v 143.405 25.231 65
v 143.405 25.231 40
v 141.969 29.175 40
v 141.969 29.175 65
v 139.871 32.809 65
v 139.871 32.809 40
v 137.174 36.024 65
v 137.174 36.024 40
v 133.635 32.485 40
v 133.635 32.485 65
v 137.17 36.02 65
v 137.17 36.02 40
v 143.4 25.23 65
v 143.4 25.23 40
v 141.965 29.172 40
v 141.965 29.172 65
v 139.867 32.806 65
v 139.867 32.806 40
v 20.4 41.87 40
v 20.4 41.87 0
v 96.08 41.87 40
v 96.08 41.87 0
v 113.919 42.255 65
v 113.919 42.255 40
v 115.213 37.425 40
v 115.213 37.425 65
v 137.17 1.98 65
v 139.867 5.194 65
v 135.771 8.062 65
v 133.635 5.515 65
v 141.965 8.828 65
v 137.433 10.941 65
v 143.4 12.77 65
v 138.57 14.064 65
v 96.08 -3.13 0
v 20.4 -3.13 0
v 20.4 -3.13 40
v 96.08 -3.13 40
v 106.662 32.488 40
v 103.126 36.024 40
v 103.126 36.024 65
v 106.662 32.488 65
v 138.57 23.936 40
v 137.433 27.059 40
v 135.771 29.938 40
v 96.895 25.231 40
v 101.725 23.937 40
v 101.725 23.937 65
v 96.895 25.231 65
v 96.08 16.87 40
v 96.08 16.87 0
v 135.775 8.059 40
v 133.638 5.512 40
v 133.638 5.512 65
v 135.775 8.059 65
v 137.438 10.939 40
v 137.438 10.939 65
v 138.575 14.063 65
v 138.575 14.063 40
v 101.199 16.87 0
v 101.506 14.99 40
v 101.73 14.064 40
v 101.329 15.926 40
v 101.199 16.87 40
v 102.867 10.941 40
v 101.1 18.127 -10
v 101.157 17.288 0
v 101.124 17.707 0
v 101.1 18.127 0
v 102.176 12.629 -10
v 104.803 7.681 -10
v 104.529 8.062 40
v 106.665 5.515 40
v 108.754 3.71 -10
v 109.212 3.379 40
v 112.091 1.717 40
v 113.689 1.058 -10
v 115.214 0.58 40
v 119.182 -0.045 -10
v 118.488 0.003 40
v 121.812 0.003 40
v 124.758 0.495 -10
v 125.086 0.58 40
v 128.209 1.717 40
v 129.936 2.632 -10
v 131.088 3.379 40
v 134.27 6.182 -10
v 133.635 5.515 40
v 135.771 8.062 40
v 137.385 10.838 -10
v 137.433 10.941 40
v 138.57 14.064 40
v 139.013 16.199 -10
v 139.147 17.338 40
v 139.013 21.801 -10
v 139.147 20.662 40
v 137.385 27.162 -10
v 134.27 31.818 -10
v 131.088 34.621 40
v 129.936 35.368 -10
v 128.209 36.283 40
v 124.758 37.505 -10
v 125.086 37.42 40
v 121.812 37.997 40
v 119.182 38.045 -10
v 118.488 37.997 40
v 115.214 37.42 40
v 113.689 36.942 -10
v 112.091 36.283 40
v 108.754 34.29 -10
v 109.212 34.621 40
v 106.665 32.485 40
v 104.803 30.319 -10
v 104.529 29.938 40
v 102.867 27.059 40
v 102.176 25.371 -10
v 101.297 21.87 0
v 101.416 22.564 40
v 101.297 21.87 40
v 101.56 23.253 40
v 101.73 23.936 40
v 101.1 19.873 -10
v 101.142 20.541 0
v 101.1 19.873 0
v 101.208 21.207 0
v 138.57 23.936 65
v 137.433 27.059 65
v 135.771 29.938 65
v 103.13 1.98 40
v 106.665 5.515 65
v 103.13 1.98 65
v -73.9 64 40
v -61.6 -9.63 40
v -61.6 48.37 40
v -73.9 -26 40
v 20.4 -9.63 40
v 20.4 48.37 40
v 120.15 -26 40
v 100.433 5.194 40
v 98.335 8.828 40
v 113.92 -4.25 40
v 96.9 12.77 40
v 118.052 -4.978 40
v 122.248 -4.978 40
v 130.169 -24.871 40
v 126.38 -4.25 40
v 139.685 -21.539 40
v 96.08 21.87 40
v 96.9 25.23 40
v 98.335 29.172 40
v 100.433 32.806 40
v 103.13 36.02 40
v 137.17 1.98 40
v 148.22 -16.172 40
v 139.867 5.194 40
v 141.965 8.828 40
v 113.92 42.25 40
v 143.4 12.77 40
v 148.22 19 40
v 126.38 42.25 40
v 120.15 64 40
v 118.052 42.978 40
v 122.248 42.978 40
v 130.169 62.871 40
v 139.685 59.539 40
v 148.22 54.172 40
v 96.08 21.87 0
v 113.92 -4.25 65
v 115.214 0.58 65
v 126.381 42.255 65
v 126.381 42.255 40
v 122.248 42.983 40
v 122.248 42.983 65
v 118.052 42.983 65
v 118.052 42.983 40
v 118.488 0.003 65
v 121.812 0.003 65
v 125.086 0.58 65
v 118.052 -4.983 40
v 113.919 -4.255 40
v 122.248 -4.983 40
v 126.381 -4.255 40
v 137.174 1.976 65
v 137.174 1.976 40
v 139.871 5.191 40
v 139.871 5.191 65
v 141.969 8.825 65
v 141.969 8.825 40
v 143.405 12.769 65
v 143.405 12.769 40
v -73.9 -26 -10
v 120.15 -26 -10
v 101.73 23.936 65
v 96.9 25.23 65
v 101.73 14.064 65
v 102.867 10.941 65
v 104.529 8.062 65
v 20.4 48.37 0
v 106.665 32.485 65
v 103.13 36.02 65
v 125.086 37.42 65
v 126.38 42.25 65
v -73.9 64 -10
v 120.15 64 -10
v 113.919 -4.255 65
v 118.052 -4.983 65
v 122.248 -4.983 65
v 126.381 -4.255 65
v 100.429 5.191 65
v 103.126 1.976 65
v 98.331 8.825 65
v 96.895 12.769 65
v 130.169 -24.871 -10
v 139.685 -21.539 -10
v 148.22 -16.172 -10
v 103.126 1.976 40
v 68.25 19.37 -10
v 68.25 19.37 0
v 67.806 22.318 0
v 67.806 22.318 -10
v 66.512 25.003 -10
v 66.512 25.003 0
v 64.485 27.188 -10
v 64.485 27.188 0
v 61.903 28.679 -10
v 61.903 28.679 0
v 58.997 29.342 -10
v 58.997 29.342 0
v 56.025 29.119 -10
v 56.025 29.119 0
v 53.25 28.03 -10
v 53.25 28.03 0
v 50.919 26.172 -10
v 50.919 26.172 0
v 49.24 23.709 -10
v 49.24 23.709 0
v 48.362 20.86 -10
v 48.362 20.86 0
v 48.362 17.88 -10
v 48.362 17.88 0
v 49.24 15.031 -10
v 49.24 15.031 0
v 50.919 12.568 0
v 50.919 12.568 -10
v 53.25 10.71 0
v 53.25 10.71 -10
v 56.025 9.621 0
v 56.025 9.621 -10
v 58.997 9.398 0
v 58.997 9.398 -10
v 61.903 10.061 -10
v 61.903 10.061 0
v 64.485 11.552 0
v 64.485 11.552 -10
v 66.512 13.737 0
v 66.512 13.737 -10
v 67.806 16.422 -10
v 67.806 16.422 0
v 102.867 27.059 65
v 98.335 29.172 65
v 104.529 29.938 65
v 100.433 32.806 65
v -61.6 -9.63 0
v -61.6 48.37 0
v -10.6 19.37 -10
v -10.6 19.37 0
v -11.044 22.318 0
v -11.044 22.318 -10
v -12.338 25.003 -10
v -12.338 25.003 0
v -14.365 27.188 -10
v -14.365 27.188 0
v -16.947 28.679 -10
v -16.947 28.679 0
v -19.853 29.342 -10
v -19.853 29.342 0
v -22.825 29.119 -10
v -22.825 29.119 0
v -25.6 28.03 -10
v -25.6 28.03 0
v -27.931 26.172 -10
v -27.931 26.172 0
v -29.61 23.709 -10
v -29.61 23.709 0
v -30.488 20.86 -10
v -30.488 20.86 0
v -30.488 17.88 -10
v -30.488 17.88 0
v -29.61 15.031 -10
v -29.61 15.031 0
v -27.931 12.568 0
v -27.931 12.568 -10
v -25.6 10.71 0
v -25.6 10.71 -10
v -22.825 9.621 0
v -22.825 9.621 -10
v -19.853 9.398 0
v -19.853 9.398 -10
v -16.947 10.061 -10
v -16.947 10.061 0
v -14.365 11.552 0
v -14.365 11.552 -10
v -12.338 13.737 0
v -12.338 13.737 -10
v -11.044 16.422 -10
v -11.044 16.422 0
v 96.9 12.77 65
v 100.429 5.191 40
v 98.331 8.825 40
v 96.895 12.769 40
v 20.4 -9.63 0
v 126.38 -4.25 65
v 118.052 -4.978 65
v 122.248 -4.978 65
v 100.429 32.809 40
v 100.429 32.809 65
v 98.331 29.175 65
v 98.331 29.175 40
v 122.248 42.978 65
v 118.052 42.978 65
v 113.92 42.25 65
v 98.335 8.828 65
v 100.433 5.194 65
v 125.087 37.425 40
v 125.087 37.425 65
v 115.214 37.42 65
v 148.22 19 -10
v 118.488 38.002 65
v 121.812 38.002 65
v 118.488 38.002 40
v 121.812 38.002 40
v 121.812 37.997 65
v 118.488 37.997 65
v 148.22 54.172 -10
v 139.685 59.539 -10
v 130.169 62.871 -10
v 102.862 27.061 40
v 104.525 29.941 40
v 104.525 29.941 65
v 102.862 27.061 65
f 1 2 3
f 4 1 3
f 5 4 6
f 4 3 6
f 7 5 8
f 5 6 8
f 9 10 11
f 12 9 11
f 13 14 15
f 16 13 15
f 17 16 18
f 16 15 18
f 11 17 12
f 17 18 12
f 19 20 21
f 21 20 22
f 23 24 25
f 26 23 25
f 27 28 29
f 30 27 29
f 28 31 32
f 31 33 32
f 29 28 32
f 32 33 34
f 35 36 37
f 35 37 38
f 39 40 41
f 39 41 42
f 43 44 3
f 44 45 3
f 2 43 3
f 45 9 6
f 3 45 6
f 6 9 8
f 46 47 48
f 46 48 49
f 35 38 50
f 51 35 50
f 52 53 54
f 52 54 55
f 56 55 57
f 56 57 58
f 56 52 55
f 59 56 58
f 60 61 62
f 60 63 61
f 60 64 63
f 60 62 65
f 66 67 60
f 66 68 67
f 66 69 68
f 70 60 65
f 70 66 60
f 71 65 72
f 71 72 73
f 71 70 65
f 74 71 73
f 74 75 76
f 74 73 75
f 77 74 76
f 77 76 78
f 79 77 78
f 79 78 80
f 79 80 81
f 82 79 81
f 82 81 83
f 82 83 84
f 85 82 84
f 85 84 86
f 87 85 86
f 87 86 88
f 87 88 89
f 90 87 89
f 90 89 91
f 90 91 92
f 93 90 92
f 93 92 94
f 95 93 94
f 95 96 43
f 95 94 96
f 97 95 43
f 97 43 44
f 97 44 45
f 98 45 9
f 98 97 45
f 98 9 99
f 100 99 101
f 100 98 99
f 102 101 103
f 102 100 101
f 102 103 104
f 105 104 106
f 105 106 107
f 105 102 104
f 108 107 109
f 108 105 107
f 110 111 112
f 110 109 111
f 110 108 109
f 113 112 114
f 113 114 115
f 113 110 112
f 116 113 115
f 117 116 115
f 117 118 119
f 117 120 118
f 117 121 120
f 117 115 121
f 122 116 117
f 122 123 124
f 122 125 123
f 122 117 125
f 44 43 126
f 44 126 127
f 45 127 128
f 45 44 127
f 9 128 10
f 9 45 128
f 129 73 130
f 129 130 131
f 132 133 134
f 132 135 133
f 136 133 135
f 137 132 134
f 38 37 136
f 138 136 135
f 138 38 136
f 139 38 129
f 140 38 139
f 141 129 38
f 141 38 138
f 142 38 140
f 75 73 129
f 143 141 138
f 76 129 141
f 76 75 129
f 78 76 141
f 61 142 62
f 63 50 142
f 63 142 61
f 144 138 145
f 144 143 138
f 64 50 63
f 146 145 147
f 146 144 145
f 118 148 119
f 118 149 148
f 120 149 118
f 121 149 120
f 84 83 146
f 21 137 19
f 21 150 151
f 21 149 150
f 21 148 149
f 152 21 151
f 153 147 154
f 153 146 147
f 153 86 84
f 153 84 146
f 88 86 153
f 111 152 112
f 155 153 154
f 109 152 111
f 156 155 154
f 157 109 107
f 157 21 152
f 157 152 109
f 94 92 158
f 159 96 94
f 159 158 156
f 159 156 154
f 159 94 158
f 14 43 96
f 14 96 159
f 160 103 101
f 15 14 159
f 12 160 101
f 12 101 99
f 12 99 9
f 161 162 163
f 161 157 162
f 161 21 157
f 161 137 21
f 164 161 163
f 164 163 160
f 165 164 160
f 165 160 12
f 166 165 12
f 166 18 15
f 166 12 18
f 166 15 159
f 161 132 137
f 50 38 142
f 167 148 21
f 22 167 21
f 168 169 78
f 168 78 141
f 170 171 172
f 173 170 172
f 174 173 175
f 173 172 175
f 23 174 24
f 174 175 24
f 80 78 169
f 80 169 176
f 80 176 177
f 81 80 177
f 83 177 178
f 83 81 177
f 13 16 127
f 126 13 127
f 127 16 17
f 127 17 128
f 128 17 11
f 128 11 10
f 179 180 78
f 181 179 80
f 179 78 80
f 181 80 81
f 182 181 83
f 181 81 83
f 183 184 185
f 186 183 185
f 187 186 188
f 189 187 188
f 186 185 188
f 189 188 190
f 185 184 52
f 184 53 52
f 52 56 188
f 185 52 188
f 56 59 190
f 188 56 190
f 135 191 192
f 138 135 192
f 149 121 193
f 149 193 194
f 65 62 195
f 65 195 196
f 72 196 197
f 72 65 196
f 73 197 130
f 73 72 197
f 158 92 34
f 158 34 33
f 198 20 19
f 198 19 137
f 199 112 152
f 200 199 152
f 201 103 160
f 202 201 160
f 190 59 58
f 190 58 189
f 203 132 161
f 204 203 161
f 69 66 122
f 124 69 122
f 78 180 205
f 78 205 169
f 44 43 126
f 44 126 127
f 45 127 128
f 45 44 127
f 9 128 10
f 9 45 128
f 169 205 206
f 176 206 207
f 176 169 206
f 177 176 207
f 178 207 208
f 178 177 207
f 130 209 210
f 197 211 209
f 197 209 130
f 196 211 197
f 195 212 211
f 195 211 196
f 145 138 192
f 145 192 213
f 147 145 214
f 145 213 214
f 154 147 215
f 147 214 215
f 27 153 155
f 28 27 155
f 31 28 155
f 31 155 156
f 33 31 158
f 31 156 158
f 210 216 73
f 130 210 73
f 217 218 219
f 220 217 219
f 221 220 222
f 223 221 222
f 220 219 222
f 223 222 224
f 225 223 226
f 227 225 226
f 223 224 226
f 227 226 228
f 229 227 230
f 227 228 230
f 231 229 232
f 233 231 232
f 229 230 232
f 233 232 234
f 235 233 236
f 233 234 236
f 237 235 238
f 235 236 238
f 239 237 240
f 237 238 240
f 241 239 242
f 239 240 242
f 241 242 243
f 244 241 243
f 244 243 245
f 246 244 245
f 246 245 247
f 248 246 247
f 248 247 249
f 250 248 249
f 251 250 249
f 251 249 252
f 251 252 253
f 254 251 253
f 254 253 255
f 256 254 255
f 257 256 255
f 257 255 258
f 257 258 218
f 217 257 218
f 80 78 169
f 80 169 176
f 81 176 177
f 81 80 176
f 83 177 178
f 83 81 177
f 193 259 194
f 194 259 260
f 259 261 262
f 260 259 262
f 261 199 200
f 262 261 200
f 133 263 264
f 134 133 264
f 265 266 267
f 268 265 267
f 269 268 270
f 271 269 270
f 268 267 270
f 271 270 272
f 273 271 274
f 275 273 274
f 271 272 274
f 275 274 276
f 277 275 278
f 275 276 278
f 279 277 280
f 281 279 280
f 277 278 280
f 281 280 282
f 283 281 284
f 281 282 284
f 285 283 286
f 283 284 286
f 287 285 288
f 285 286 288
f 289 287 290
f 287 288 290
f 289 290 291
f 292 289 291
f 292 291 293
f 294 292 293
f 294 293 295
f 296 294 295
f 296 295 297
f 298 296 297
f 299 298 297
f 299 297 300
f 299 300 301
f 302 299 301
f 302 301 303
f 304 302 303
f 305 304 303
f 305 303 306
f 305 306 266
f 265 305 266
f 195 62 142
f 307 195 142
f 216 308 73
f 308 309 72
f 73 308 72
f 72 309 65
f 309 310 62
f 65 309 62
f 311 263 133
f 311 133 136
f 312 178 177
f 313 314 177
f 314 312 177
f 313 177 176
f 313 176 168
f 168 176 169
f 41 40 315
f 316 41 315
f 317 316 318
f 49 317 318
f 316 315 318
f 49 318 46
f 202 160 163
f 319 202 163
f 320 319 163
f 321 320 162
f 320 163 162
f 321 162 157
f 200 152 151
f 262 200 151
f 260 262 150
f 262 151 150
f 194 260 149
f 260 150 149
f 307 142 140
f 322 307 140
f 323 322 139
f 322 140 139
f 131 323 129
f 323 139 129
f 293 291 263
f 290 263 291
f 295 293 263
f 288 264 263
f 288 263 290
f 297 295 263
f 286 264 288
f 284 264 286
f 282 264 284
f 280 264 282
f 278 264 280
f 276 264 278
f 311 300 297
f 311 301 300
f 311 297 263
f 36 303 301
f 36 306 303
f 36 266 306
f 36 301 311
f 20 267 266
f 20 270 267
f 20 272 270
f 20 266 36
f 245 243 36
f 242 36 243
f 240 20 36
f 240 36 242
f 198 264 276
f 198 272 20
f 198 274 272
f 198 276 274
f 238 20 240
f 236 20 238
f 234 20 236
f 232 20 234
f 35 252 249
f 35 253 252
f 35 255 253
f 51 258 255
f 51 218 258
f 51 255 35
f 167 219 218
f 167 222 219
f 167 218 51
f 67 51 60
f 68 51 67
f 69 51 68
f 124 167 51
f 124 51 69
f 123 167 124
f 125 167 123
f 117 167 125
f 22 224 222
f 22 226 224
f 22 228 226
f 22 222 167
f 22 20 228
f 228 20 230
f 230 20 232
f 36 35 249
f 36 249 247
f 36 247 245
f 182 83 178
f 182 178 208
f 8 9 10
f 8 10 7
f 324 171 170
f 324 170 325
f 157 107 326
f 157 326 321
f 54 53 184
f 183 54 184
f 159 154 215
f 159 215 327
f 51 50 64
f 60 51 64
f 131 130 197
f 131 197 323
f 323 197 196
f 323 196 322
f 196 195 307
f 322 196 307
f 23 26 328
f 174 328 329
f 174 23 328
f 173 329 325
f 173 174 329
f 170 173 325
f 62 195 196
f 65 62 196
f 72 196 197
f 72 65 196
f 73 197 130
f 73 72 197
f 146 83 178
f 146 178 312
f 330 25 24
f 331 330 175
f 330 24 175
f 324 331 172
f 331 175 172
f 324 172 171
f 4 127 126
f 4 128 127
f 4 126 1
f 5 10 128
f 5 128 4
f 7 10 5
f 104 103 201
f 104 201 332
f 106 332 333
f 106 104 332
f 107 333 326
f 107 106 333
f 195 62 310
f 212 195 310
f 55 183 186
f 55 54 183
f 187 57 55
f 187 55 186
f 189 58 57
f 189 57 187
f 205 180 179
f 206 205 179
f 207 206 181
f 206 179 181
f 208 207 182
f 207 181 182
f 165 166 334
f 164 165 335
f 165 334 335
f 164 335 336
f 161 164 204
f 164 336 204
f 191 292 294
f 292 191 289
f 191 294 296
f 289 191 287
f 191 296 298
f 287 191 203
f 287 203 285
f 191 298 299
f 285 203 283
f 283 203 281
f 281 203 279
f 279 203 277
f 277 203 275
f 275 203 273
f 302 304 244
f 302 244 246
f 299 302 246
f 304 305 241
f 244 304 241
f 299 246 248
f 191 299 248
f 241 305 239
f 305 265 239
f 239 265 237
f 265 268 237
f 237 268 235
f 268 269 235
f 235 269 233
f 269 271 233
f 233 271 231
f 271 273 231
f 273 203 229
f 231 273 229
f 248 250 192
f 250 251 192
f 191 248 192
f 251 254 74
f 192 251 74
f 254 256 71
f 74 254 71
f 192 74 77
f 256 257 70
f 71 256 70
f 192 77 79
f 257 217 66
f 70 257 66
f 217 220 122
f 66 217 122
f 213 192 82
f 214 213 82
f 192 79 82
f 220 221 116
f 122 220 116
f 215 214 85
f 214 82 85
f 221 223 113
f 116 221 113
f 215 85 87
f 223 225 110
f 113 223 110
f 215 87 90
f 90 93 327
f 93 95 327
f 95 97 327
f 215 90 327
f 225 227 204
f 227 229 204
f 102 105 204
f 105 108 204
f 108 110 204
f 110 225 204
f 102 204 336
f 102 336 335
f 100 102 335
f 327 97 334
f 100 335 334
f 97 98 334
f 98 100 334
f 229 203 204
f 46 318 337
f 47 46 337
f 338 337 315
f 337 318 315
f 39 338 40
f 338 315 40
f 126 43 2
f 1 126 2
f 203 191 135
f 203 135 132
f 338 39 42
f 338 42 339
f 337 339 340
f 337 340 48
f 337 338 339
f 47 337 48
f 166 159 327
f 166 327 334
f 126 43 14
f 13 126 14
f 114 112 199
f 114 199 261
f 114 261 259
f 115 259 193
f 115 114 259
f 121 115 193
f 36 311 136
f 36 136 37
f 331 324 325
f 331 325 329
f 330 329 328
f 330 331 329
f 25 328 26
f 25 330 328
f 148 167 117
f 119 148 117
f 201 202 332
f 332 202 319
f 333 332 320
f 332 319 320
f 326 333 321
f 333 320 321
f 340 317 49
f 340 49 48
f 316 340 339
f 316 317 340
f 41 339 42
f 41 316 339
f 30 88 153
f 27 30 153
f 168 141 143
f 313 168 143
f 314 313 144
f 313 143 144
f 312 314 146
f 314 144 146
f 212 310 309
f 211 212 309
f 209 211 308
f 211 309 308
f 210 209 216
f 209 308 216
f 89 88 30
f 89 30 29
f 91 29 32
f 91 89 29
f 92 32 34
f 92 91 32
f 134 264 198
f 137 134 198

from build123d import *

# Parameters (mm, degrees)
EXTRUDE004_DEPTH                          = 25
EXTRUDE004_ONTO_SKETCH003_PLACEMENT_ANGLE = 15
SKETCH005_W                               = 9
SKETCH005_H                               = 5
EXTRUDE008_DEPTH                          = 40
EXTRUDE005_DEPTH                          = 50
EXTRUDE005_ONTO_SKETCH004_PLACEMENT_ANGLE = 15
TUBE_R                                    = 45
TUBE_R_2                                  = 19.07
TUBE_DEPTH                                = 50
TUBE_PLACEMENT_ANGLE                      = 15
SKETCH007_W                               = 19.05
SKETCH007_H                               = 4.2311699947
EXTRUDE009_DEPTH                          = 50
SKETCH006_R                               = 10
EXTRUDE007_DEPTH                          = 20
BOX001_W                                  = 82
BOX001_H                                  = 58
BOX001_DEPTH                              = 44.4
BOX007_W                                  = 5
BOX007_H                                  = 5
BOX007_DEPTH                              = 44.4
SKETCH001_R                               = 5
EXTRUDE001_DEPTH                          = 4
EXTRUDE002_DEPTH                          = 15
SKETCH_R                                  = 12.3
EXTRUDE_DEPTH                             = 5
BOX_W                                     = 75.7
BOX_H                                     = 45
BOX_DEPTH                                 = 44.4
BOX002_W                                  = 175
BOX002_H                                  = 90
BOX002_DEPTH                              = 50
EXTRUDE010_DEPTH                          = 25


with BuildPart() as fingers:
    # Sketch003 as drawn → Extrude004 (new)
    with BuildSketch(Plane.XY):
        with BuildLine():
            ThreePointArc((12.0375, 20.8495615961), (6.2310685108, 23.2546642679), (0, 24.075))
            Line((0, 24.075), (0, 19.075))
            ThreePointArc((9.5375, 16.5194345772), (4.9369732853, 18.4250351365), (0, 19.075))
            Line((12.0375, 20.8495615961), (9.5375, 16.5194345772))
        make_face()
        with BuildLine():
            ThreePointArc((24.075, 0), (23.2546642679, 6.2310685108), (20.8495615961, 12.0375))
            Line((16.5151044502, 9.535), (20.8495615961, 12.0375))
            ThreePointArc((19.07, 0), (18.4202055073, 4.9356791901), (16.5151044502, 9.535))
            Line((19.07, 0), (24.075, 0))
        make_face()
        with BuildLine():
            ThreePointArc((12.0375, -20.8495615961), (17.0235957571, -17.0235957571), (20.8495615961, -12.0375))
            Line((16.5194345772, -9.5375), (20.8495615961, -12.0375))
            ThreePointArc((9.5375, -16.5194345772), (13.4880618511, -13.4880618511), (16.5194345772, -9.5375))
            Line((9.5375, -16.5194345772), (12.0375, -20.8495615961))
        make_face()
        with BuildLine():
            ThreePointArc((-12.0375, -20.8495615961), (-6.2310685108, -23.2546642679), (0, -24.075))
            Line((0, -19.07), (0, -24.075))
            ThreePointArc((-9.535, -16.5151044502), (-4.9356791901, -18.4202055073), (0, -19.07))
            Line((-12.0375, -20.8495615961), (-9.535, -16.5151044502))
        make_face()
        with BuildLine():
            ThreePointArc((-24.075, 0), (-23.2546642679, -6.2310685108), (-20.8495615961, -12.0375))
            Line((-20.8495615961, -12.0375), (-16.5151044502, -9.535))
            ThreePointArc((-19.07, 0), (-18.4202055073, -4.9356791901), (-16.5151044502, -9.535))
            Line((-19.07, 0), (-24.075, 0))
        make_face()
        with BuildLine():
            ThreePointArc((-12.0375, 20.8495615961), (-17.0235957571, 17.0235957571), (-20.8495615961, 12.0375))
            Line((-16.5194345772, 9.5375), (-20.8495615961, 12.0375))
            ThreePointArc((-9.5375, 16.5194345772), (-13.4880618511, 13.4880618511), (-16.5194345772, 9.5375))
            Line((-12.0375, 20.8495615961), (-9.5375, 16.5194345772))
        make_face()
    extrude(amount=EXTRUDE004_DEPTH)


with BuildPart() as fingers_1:
    # Extrude004 onto Sketch003 placement: moved
    add(fingers.part.moved(Location((120.15, 19, 40))).rotate(Axis((120.15, 19, 40), (0, 0, 1)), EXTRUDE004_ONTO_SKETCH003_PLACEMENT_ANGLE))


with BuildPart() as extrude008:
    # Sketch005 (on Face18 of Cut) → Extrude008 (new body)
    with BuildSketch(Plane.XY):
        with Locations((80.5, 19.37)):
            Rectangle(SKETCH005_W, SKETCH005_H)
    extrude(amount=EXTRUDE008_DEPTH)


with BuildPart() as extrude008_1:
    # Extrude008 placement: moved
    add(extrude008.part.moved(Location((18.29, 0, 0))))


with BuildPart() as roundoff:
    # Sketch004 as drawn → Extrude005 (new)
    with BuildSketch(Plane.XY):
        Polygon((27.1135379439, -7.265050596), (36.2167416935, 26.7085683089), (52.5698659325, 22.3267618753), (43.466662183, -11.6468570296), (34.3634584335, -45.6204759345), (18.0103341944, -41.2386695009), align=None)
        Polygon((-33.0905251328, -30.4961824896), (-13.4091441448, 42.9557313208), (-33.625971689, 48.3728139348), (-43.466662183, 11.6468570296), (-53.307352677, -25.0790998756), align=None)
    extrude(amount=-EXTRUDE005_DEPTH)


with BuildPart() as roundoff_1:
    # Extrude005 onto Sketch004 placement: moved
    add(roundoff.part.moved(Location((120.15, 19, 40))).rotate(Axis((120.15, 19, 40), (0, 0, 1)), EXTRUDE005_ONTO_SKETCH004_PLACEMENT_ANGLE))


with BuildPart() as cut003:
    # Tube → Tube (new body)
    with BuildSketch(Plane.XY):
        Circle(TUBE_R)
        Circle(TUBE_R_2, mode=Mode.SUBTRACT)
    extrude(amount=TUBE_DEPTH)


with BuildPart() as cut003_1:
    # Tube placement: moved
    add(cut003.part.moved(Location((120.15, 19, -10))).rotate(Axis((120.15, 19, -10), (0, 0, 1)), TUBE_PLACEMENT_ANGLE))

    # Cut001: cut RoundOff
    add(roundoff_1.part, mode=Mode.SUBTRACT)

    # Cut003: cut Extrude008
    add(extrude008_1.part, mode=Mode.SUBTRACT)


with BuildPart() as bridgingblocks:
    # Sketch007 → Extrude009 (new body)
    with BuildSketch(Plane.XY.offset(40)):
        with Locations((110.625, -23.8844150026)):
            Rectangle(SKETCH007_W, SKETCH007_H)
        with Locations((110.625, 61.8844150026)):
            Rectangle(SKETCH007_W, SKETCH007_H)
    extrude(amount=-EXTRUDE009_DEPTH)


with BuildPart() as holepunchextrude001:
    # Sketch006 (on Face20 of Cut) → Extrude007 (new body)
    with BuildSketch(Plane.XY):
        with Locations((-38.7, 19.37)):
            Circle(SKETCH006_R)
        with Locations((40.15, 19.37)):
            Circle(SKETCH006_R)
    extrude(amount=-EXTRUDE007_DEPTH)


with BuildPart() as motorhead:
    # Box001 → Box001 (new body)
    with BuildSketch(Plane(origin=(-82, -9.63, 0), x_dir=(1, 0, 0), z_dir=(0, 0, 1))):
        with Locations((41, 29)):
            Rectangle(BOX001_W, BOX001_H)
    extrude(amount=BOX001_DEPTH)


with BuildPart() as nubchannel:
    # Box007 → Box007 (new body)
    with BuildSketch(Plane(origin=(75.7, 16.87, 0), x_dir=(1, 0, 0), z_dir=(0, 0, 1))):
        with Locations((2.5, 2.5)):
            Rectangle(BOX007_W, BOX007_H)
    extrude(amount=BOX007_DEPTH)


with BuildPart() as motorshaftfull:
    # Sketch001 (on Face3 of Extrude) → Extrude001 (new body)
    with BuildSketch(Plane.XY.offset(49.4)):
        with Locations((-58.7, 20.37)):
            Circle(SKETCH001_R)
    extrude(amount=EXTRUDE001_DEPTH)


with BuildPart() as motorshaftd:
    # Sketch002 (on Face3 of Extrude001) → Extrude002 (new body)
    with BuildSketch(Plane.XY.offset(53.4)):
        with BuildLine():
            Line((-62.7, 23.37), (-62.7, 17.37))
            ThreePointArc((-62.7, 17.37), (-53.7, 20.37), (-62.7, 23.37))
        make_face()
    extrude(amount=EXTRUDE002_DEPTH)


with BuildPart() as motorshaftassembly:
    # Sketch (on Face6 of Box001) → Extrude (new body)
    with BuildSketch(Plane(origin=(-82, -9.63, 44.4), x_dir=(1, 0, 0), z_dir=(0, 0, 1))):
        with Locations((23.3, 30)):
            Circle(SKETCH_R)
    extrude(amount=EXTRUDE_DEPTH)

    # Fusion: union MotorShaftFull, MotorShaftD
    add(motorshaftfull.part)
    add(motorshaftd.part)


with BuildPart() as motor:
    # Box → Box (new body)
    with BuildSketch(Plane(origin=(0, -3.13, 0), x_dir=(1, 0, 0), z_dir=(0, 0, 1))):
        with Locations((37.85, 22.5)):
            Rectangle(BOX_W, BOX_H)
    extrude(amount=BOX_DEPTH)

    # Fusion005: union MotorHead, NubChannel, MotorShaftAssembly
    add(motorhead.part)
    add(nubchannel.part)
    add(motorshaftassembly.part)


with BuildPart() as motor_1:
    # Fusion005 placement: moved
    add(motor.part.moved(Location((2.3, 0, 0))))


with BuildPart() as fusion006:
    # Box002 → Box002 (new body)
    with BuildSketch(Plane(origin=(-92, -26, -10), x_dir=(1, 0, 0), z_dir=(0, 0, 1))):
        with Locations((87.5, 45)):
            Rectangle(BOX002_W, BOX002_H)
    extrude(amount=BOX002_DEPTH)

    # Cut: cut Motor
    add(motor_1.part, mode=Mode.SUBTRACT)

    # Cut002: cut HolePunchExtrude001
    add(holepunchextrude001.part, mode=Mode.SUBTRACT)


with BuildPart() as fusion006_1:
    # Cut002 placement: moved
    add(fusion006.part.moved(Location((18.1, 0, 0))))

    # Fusion006: union Cut003, BridgingBlocks
    add(cut003_1.part)
    add(bridgingblocks.part)


with BuildPart() as motormountmk3:
    # Sketch008 (on Face26 of Fusion006) → Extrude010 (new body)
    with BuildSketch(Plane.XY.offset(40)):
        with BuildLine():
            ThreePointArc((133.6345263172, 5.5154736828), (136.6651044502, 9.465), (138.5702055073, 14.0643208099))
            Line((138.5702055073, 14.0643208099), (143.3998346388, 12.7702255844))
            ThreePointArc((137.1700602232, 1.9799397768), (140.9952314691, 6.965), (143.3998346388, 12.7702255844))
            Line((133.6345263172, 5.5154736828), (137.1700602232, 1.9799397768))
        make_face()
        with BuildLine():
            ThreePointArc((115.2143208099, 0.5797944927), (120.15, -0.07), (125.0856791901, 0.5797944927))
            Line((125.0856791901, 0.5797944927), (126.3797744156, -4.2498346388))
            ThreePointArc((113.9202255845, -4.2498346388), (120.1500000001, -5.07), (126.3797744156, -4.2498346388))
            Line((115.2143208099, 0.5797944927), (113.9202255845, -4.2498346389))
        make_face()
        with BuildLine():
            ThreePointArc((101.7297944927, 14.0643208099), (103.6348955498, 9.465), (106.6654736828, 5.5154736828))
            Line((106.6654736828, 5.5154736828), (103.1299397768, 1.9799397768))
            ThreePointArc((96.9001653612, 12.7702255844), (99.3047685309, 6.965), (103.1299397768, 1.9799397768))
            Line((101.7297944927, 14.0643208099), (96.9001653612, 12.7702255844))
        make_face()
        with BuildLine():
            ThreePointArc((138.5702055073, 23.9356791901), (136.6651044502, 28.535), (133.6345263172, 32.4845263172))
            Line((133.6345263172, 32.4845263172), (137.1700602232, 36.0200602232))
            ThreePointArc((143.3998346388, 25.2297744156), (140.9952314691, 31.035), (137.1700602232, 36.0200602232))
            Line((138.5702055073, 23.9356791901), (143.3998346388, 25.2297744156))
        make_face()
        with BuildLine():
            ThreePointArc((125.0856791901, 37.4202055073), (120.15, 38.07), (115.2143208099, 37.4202055073))
            Line((115.2143208099, 37.4202055073), (113.9202255844, 42.2498346388))
            ThreePointArc((126.3797744156, 42.2498346388), (120.15, 43.07), (113.9202255844, 42.2498346388))
            Line((125.0856791901, 37.4202055073), (126.3797744156, 42.2498346388))
        make_face()
        with BuildLine():
            ThreePointArc((106.6654736828, 32.4845263172), (103.6348955498, 28.535), (101.7297944927, 23.9356791901))
            Line((101.7297944927, 23.9356791901), (96.9001653612, 25.2297744156))
            ThreePointArc((103.1299397768, 36.0200602232), (99.3047685309, 31.035), (96.9001653612, 25.2297744156))
            Line((106.6654736828, 32.4845263172), (103.1299397768, 36.0200602232))
        make_face()
    extrude(amount=EXTRUDE010_DEPTH)

    # Fusion007: union Fusion006
    add(fusion006_1.part)


solid = Compound([fingers_1.part, motormountmk3.part])
